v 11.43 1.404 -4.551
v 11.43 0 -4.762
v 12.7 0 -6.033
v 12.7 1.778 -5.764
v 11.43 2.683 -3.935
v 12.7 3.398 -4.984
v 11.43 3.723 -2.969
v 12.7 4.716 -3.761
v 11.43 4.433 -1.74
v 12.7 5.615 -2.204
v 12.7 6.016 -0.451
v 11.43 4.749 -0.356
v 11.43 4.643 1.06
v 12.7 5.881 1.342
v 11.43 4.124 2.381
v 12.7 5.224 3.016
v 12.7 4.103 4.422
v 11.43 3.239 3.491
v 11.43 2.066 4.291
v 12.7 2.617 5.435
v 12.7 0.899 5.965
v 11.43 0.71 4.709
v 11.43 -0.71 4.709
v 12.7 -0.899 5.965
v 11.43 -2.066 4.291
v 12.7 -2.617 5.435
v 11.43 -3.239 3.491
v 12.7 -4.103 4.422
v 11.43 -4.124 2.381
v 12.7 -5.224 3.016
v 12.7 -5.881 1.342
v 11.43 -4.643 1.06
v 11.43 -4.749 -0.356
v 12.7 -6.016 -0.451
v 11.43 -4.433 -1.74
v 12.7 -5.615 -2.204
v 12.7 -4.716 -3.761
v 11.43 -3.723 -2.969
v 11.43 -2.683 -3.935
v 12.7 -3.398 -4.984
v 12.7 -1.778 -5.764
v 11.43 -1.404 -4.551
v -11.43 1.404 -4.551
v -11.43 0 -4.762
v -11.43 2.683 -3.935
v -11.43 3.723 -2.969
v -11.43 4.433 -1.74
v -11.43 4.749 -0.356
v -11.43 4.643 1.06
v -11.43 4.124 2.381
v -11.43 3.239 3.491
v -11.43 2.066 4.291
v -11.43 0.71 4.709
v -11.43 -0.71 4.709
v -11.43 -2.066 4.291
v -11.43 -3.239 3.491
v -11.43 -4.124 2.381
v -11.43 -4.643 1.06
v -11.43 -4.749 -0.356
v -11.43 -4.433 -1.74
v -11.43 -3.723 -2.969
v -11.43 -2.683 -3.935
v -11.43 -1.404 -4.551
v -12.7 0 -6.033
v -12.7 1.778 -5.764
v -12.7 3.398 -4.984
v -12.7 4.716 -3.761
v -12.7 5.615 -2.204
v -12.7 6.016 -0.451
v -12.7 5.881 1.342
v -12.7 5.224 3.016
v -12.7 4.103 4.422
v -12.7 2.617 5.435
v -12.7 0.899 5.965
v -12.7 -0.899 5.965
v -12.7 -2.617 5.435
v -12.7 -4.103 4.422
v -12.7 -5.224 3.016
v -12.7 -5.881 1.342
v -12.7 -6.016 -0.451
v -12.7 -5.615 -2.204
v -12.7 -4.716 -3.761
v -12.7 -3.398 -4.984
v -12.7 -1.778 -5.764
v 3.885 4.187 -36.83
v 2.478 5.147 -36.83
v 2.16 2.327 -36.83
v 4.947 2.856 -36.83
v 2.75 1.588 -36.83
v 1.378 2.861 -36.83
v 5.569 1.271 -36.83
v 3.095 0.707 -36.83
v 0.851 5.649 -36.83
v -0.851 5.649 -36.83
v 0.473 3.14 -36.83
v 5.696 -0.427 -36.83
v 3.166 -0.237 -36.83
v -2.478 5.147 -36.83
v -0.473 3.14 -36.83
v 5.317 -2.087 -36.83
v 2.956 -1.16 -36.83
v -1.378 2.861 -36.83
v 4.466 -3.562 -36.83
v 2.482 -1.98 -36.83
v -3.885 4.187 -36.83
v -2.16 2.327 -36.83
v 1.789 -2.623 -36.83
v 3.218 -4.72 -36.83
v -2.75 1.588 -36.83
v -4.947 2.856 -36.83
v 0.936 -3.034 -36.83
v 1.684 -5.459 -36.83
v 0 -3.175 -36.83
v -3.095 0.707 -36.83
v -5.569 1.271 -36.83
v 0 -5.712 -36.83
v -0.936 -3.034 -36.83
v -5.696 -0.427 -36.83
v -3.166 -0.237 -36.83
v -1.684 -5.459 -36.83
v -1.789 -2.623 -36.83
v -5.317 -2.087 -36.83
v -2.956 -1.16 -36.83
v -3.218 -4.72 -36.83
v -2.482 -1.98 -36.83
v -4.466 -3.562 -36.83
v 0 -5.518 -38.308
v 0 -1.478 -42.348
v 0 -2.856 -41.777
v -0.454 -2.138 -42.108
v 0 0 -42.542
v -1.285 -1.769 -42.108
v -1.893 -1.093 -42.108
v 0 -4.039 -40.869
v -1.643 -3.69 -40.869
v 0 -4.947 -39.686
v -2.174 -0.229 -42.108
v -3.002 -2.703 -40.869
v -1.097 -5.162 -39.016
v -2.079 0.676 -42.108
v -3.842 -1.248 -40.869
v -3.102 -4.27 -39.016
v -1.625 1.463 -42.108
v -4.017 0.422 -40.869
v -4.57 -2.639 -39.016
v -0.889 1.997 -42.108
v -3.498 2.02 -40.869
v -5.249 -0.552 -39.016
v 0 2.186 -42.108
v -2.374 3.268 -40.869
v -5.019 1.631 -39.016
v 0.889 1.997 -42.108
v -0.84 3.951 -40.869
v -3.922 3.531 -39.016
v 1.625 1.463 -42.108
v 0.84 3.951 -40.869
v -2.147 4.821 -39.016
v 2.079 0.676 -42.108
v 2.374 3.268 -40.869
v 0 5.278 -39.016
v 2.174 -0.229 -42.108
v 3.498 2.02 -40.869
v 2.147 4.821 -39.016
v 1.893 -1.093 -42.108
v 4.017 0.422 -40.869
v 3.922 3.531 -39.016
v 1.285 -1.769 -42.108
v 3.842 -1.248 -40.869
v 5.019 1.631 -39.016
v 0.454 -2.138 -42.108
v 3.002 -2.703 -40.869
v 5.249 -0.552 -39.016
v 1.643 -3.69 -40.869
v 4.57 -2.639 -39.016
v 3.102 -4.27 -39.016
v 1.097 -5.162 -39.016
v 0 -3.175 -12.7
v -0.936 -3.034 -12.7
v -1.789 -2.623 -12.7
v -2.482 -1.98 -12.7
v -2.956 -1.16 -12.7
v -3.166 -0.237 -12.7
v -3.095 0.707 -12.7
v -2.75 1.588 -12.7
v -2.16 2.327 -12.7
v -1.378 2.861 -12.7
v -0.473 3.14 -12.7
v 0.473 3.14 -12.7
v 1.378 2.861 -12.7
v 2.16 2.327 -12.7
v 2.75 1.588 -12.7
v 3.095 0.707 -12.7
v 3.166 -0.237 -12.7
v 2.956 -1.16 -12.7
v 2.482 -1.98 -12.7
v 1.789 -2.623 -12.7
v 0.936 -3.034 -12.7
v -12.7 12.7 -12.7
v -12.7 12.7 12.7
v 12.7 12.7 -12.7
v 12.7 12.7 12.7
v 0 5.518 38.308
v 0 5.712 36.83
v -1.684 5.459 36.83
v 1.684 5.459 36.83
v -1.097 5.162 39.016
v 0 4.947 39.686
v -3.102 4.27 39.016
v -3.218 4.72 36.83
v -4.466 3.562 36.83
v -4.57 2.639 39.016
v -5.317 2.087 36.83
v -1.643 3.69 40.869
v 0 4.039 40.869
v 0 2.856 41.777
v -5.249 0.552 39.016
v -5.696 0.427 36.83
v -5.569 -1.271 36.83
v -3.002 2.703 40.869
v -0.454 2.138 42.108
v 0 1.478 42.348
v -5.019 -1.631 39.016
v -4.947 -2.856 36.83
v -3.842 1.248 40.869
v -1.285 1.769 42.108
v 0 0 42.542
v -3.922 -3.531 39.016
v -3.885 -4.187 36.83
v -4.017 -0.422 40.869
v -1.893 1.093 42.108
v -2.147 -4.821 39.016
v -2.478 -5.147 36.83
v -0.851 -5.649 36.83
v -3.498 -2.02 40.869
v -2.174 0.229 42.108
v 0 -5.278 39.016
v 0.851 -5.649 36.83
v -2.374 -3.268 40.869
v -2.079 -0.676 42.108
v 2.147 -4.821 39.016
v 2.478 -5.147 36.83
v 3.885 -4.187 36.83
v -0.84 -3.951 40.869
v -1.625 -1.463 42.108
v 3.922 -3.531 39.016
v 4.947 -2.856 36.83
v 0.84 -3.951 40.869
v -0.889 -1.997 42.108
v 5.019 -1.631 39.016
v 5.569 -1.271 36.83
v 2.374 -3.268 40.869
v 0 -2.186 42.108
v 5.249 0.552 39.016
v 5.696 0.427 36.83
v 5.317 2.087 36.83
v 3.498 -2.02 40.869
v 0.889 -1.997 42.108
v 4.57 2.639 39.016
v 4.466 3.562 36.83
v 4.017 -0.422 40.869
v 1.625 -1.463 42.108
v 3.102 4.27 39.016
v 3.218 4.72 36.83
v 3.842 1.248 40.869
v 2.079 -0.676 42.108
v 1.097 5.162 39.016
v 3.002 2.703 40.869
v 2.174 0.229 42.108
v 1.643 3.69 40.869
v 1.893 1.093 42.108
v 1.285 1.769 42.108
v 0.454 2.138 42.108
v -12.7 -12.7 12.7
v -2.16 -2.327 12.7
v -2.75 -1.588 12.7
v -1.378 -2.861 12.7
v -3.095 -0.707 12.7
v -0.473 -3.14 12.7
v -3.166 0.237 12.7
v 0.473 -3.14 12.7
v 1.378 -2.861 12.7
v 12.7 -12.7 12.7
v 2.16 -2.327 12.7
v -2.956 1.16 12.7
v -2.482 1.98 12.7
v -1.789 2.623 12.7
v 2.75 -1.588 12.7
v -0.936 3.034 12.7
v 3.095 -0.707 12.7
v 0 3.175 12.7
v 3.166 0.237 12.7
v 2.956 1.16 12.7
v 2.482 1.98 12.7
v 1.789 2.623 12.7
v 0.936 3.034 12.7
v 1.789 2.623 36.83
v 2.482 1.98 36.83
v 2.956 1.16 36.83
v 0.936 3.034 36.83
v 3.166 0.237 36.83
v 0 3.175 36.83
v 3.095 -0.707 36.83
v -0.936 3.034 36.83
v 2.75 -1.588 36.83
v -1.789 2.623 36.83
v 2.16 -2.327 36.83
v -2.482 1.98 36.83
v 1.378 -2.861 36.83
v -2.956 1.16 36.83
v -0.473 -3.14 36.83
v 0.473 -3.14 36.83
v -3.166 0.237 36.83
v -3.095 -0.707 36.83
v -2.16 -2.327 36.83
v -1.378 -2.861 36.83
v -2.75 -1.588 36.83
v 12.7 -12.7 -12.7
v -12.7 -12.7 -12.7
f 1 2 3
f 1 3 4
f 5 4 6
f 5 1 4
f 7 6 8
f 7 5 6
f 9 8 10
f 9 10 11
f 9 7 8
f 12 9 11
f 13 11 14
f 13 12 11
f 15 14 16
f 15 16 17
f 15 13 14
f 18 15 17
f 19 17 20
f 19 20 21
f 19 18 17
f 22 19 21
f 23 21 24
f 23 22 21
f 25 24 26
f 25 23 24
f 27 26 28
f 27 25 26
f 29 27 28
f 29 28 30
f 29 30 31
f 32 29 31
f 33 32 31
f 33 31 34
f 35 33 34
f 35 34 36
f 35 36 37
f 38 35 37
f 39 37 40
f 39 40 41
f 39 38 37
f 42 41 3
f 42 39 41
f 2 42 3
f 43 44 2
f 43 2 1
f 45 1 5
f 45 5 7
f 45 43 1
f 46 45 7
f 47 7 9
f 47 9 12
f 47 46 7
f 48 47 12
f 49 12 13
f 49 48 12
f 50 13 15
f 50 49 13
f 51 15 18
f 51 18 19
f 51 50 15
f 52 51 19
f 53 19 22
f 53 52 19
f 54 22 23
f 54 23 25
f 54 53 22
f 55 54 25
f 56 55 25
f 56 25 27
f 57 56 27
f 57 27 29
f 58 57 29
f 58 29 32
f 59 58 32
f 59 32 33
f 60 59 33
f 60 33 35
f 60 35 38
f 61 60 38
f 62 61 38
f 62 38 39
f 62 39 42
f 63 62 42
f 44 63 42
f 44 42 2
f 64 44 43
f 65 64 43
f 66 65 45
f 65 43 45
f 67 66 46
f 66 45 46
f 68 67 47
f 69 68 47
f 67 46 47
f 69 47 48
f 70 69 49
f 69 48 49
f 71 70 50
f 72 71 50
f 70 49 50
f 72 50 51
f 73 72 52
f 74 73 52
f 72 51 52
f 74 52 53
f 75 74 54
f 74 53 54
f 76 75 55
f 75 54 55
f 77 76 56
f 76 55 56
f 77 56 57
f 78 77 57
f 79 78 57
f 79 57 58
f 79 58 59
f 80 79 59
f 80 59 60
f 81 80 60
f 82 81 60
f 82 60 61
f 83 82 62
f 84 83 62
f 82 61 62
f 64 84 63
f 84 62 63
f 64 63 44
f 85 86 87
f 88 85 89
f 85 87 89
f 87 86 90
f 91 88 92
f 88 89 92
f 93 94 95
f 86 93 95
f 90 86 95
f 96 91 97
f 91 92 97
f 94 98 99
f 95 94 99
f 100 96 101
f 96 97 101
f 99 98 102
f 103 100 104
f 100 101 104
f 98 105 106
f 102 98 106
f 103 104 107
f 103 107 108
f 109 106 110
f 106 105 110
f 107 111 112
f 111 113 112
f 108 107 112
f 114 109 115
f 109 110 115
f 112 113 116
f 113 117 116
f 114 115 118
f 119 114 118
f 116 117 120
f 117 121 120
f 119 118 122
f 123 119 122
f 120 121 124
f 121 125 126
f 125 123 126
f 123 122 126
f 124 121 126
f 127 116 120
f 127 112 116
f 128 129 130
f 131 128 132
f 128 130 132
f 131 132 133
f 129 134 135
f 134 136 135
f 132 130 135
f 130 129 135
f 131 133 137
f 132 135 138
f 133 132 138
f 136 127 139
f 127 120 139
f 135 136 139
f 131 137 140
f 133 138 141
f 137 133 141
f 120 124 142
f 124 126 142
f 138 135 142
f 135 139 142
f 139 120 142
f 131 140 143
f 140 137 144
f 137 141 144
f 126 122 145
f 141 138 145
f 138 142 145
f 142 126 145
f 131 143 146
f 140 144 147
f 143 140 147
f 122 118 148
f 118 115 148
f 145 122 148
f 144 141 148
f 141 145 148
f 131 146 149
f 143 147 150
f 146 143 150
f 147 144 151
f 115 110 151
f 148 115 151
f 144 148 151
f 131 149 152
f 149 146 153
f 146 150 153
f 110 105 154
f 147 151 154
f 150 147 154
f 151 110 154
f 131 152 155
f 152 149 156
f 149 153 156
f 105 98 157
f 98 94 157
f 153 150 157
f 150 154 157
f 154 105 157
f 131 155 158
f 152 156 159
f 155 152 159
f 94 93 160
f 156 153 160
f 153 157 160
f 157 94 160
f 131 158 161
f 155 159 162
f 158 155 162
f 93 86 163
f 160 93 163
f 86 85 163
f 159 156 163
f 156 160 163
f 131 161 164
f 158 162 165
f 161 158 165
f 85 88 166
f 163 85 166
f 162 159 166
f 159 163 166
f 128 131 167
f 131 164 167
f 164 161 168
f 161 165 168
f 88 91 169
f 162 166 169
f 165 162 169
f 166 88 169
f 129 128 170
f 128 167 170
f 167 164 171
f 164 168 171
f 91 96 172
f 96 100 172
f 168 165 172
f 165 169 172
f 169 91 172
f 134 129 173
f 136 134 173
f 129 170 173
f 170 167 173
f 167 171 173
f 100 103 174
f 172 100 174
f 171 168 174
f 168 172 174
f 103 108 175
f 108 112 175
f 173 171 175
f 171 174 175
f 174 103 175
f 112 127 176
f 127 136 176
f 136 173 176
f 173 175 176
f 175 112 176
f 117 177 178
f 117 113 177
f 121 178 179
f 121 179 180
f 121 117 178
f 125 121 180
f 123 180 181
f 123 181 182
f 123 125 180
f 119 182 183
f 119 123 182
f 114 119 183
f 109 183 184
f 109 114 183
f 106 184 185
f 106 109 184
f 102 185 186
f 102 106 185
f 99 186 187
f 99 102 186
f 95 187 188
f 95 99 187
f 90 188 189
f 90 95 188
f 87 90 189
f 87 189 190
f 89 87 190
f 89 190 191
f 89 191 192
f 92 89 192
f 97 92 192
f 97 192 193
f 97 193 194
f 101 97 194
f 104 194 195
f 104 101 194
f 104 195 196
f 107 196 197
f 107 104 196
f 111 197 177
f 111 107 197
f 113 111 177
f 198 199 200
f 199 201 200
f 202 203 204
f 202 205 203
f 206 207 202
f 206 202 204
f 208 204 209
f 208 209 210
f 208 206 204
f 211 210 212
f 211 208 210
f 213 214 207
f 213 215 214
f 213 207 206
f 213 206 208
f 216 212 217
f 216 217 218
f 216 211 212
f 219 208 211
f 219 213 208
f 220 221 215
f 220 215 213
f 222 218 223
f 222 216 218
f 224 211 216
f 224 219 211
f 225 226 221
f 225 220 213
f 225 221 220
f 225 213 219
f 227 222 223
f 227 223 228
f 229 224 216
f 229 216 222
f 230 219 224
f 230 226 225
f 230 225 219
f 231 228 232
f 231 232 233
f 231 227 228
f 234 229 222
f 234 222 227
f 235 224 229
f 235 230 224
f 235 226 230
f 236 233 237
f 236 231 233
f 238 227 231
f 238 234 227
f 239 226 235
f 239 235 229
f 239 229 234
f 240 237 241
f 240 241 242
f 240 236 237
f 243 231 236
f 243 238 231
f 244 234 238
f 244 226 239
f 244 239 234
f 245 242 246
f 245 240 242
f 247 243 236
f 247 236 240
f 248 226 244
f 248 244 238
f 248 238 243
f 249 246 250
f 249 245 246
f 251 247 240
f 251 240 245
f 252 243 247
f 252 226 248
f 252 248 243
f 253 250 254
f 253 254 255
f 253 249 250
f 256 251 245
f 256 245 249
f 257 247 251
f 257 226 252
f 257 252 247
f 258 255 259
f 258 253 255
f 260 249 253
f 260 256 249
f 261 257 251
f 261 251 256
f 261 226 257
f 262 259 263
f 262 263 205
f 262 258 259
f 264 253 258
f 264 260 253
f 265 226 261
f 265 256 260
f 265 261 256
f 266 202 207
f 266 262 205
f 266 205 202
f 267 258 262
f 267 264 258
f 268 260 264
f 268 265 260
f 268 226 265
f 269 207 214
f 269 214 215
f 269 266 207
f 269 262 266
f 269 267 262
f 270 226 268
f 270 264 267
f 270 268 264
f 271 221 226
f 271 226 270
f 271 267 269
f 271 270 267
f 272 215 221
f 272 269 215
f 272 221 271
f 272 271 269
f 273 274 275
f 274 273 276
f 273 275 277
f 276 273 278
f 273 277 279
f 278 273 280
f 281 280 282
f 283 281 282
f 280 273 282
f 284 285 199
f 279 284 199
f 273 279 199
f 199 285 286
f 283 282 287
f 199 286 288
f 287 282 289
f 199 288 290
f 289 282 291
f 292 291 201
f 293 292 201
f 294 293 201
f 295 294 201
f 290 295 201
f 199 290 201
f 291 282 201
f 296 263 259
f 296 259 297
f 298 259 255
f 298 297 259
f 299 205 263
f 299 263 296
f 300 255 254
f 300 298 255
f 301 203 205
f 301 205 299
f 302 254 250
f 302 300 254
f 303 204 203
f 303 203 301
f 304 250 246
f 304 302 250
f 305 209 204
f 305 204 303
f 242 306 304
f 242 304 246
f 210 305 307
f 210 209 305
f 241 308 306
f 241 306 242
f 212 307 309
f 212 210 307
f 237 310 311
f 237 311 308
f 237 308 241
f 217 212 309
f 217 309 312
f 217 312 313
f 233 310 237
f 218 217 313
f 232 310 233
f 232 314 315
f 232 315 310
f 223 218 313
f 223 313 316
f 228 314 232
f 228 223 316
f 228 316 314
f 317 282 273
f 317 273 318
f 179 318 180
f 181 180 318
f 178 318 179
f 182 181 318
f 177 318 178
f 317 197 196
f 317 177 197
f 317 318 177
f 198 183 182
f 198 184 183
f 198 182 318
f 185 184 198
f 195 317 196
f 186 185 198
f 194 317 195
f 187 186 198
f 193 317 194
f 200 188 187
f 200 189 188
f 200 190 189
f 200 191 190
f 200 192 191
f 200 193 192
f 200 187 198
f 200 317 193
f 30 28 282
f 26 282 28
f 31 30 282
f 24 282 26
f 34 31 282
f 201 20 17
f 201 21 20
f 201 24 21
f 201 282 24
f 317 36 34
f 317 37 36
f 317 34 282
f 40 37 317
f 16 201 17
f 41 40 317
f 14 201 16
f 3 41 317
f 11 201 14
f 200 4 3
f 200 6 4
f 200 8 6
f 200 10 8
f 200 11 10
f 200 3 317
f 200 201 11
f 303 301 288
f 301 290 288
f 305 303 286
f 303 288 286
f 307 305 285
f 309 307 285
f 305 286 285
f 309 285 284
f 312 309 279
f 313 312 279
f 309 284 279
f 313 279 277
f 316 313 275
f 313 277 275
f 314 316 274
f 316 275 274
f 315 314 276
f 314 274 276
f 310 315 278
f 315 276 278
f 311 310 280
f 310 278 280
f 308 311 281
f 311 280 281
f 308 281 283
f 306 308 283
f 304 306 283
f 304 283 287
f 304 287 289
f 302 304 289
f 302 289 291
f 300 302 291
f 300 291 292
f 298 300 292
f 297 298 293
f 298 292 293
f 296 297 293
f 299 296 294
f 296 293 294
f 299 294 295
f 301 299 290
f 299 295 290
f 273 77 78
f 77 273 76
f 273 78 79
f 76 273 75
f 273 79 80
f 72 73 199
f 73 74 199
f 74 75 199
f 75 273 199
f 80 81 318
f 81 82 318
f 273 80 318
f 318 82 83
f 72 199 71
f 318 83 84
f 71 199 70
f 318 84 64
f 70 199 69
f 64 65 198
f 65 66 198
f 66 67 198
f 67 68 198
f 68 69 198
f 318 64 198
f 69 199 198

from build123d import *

# Parameters (mm, degrees)
SKETCH1_R           = 4.7625
BOSS_EXTRUDE1_DEPTH = 12.7
CHAMFER1_SIZE       = 1.27


with BuildPart() as part:
    # Sketch1 → Boss-Extrude1 (new, symmetric)
    with BuildSketch(Plane(origin=(0, 0, 0), x_dir=(0, 0, -1), z_dir=(1, 0, 0))):
        Polygon((-12.7, -12.7), (12.7, -12.7), (12.7, -3.175), (12.7, 0), (12.7, 3.175), (12.7, 12.7), (-12.7, 12.7), (-12.7, 3.175), (-12.7, 0), (-12.7, -3.175), align=None)
        Circle(SKETCH1_R, mode=Mode.SUBTRACT)
    extrude(amount=BOSS_EXTRUDE1_DEPTH, both=True)

    # Sketch1<4> → Revolve1 (revolve)
    with BuildSketch(Plane(origin=(0, 0, 0), x_dir=(0, 0, -1), z_dir=(1, 0, 0))):
        with BuildLine():
            Line((-12.7, 0), (-12.7, 3.175))
            Line((-12.7, 3.175), (-36.83, 3.175))
            Line((-36.83, 3.175), (-36.83, 5.712324878))
            ThreePointArc((-36.83, 5.712324878), (-40.869223658, 4.039223658), (-42.542324878, 0))
            Line((-42.542324878, 0), (-12.7, 0))
        make_face()
    revolve(axis=Axis((0, 0, 12.7), (0, 0, 1)))

    # Sketch1<5> → Revolve2 (revolve)
    with BuildSketch(Plane(origin=(0, 0, 0), x_dir=(0, 0, -1), z_dir=(1, 0, 0))):
        with BuildLine():
            Line((12.7, 3.175), (12.7, 0))
            Line((12.7, 0), (42.542324878, 0))
            ThreePointArc((42.542324878, 0), (40.869223658, 4.039223658), (36.83, 5.712324878))
            Line((36.83, 5.712324878), (36.83, 3.175))
            Line((36.83, 3.175), (12.7, 3.175))
        make_face()
    revolve(axis=Axis((0, 0, -12.7), (0, 0, -1)))

    # Chamfer1
    chamfer1_edges = [part.edges().sort_by_distance(p)[0] for p in [
        (-12.7, 0, 4.7625),
        (12.7, 0, 4.7625),
    ]]
    chamfer(chamfer1_edges, length=CHAMFER1_SIZE)


solid = part.part
